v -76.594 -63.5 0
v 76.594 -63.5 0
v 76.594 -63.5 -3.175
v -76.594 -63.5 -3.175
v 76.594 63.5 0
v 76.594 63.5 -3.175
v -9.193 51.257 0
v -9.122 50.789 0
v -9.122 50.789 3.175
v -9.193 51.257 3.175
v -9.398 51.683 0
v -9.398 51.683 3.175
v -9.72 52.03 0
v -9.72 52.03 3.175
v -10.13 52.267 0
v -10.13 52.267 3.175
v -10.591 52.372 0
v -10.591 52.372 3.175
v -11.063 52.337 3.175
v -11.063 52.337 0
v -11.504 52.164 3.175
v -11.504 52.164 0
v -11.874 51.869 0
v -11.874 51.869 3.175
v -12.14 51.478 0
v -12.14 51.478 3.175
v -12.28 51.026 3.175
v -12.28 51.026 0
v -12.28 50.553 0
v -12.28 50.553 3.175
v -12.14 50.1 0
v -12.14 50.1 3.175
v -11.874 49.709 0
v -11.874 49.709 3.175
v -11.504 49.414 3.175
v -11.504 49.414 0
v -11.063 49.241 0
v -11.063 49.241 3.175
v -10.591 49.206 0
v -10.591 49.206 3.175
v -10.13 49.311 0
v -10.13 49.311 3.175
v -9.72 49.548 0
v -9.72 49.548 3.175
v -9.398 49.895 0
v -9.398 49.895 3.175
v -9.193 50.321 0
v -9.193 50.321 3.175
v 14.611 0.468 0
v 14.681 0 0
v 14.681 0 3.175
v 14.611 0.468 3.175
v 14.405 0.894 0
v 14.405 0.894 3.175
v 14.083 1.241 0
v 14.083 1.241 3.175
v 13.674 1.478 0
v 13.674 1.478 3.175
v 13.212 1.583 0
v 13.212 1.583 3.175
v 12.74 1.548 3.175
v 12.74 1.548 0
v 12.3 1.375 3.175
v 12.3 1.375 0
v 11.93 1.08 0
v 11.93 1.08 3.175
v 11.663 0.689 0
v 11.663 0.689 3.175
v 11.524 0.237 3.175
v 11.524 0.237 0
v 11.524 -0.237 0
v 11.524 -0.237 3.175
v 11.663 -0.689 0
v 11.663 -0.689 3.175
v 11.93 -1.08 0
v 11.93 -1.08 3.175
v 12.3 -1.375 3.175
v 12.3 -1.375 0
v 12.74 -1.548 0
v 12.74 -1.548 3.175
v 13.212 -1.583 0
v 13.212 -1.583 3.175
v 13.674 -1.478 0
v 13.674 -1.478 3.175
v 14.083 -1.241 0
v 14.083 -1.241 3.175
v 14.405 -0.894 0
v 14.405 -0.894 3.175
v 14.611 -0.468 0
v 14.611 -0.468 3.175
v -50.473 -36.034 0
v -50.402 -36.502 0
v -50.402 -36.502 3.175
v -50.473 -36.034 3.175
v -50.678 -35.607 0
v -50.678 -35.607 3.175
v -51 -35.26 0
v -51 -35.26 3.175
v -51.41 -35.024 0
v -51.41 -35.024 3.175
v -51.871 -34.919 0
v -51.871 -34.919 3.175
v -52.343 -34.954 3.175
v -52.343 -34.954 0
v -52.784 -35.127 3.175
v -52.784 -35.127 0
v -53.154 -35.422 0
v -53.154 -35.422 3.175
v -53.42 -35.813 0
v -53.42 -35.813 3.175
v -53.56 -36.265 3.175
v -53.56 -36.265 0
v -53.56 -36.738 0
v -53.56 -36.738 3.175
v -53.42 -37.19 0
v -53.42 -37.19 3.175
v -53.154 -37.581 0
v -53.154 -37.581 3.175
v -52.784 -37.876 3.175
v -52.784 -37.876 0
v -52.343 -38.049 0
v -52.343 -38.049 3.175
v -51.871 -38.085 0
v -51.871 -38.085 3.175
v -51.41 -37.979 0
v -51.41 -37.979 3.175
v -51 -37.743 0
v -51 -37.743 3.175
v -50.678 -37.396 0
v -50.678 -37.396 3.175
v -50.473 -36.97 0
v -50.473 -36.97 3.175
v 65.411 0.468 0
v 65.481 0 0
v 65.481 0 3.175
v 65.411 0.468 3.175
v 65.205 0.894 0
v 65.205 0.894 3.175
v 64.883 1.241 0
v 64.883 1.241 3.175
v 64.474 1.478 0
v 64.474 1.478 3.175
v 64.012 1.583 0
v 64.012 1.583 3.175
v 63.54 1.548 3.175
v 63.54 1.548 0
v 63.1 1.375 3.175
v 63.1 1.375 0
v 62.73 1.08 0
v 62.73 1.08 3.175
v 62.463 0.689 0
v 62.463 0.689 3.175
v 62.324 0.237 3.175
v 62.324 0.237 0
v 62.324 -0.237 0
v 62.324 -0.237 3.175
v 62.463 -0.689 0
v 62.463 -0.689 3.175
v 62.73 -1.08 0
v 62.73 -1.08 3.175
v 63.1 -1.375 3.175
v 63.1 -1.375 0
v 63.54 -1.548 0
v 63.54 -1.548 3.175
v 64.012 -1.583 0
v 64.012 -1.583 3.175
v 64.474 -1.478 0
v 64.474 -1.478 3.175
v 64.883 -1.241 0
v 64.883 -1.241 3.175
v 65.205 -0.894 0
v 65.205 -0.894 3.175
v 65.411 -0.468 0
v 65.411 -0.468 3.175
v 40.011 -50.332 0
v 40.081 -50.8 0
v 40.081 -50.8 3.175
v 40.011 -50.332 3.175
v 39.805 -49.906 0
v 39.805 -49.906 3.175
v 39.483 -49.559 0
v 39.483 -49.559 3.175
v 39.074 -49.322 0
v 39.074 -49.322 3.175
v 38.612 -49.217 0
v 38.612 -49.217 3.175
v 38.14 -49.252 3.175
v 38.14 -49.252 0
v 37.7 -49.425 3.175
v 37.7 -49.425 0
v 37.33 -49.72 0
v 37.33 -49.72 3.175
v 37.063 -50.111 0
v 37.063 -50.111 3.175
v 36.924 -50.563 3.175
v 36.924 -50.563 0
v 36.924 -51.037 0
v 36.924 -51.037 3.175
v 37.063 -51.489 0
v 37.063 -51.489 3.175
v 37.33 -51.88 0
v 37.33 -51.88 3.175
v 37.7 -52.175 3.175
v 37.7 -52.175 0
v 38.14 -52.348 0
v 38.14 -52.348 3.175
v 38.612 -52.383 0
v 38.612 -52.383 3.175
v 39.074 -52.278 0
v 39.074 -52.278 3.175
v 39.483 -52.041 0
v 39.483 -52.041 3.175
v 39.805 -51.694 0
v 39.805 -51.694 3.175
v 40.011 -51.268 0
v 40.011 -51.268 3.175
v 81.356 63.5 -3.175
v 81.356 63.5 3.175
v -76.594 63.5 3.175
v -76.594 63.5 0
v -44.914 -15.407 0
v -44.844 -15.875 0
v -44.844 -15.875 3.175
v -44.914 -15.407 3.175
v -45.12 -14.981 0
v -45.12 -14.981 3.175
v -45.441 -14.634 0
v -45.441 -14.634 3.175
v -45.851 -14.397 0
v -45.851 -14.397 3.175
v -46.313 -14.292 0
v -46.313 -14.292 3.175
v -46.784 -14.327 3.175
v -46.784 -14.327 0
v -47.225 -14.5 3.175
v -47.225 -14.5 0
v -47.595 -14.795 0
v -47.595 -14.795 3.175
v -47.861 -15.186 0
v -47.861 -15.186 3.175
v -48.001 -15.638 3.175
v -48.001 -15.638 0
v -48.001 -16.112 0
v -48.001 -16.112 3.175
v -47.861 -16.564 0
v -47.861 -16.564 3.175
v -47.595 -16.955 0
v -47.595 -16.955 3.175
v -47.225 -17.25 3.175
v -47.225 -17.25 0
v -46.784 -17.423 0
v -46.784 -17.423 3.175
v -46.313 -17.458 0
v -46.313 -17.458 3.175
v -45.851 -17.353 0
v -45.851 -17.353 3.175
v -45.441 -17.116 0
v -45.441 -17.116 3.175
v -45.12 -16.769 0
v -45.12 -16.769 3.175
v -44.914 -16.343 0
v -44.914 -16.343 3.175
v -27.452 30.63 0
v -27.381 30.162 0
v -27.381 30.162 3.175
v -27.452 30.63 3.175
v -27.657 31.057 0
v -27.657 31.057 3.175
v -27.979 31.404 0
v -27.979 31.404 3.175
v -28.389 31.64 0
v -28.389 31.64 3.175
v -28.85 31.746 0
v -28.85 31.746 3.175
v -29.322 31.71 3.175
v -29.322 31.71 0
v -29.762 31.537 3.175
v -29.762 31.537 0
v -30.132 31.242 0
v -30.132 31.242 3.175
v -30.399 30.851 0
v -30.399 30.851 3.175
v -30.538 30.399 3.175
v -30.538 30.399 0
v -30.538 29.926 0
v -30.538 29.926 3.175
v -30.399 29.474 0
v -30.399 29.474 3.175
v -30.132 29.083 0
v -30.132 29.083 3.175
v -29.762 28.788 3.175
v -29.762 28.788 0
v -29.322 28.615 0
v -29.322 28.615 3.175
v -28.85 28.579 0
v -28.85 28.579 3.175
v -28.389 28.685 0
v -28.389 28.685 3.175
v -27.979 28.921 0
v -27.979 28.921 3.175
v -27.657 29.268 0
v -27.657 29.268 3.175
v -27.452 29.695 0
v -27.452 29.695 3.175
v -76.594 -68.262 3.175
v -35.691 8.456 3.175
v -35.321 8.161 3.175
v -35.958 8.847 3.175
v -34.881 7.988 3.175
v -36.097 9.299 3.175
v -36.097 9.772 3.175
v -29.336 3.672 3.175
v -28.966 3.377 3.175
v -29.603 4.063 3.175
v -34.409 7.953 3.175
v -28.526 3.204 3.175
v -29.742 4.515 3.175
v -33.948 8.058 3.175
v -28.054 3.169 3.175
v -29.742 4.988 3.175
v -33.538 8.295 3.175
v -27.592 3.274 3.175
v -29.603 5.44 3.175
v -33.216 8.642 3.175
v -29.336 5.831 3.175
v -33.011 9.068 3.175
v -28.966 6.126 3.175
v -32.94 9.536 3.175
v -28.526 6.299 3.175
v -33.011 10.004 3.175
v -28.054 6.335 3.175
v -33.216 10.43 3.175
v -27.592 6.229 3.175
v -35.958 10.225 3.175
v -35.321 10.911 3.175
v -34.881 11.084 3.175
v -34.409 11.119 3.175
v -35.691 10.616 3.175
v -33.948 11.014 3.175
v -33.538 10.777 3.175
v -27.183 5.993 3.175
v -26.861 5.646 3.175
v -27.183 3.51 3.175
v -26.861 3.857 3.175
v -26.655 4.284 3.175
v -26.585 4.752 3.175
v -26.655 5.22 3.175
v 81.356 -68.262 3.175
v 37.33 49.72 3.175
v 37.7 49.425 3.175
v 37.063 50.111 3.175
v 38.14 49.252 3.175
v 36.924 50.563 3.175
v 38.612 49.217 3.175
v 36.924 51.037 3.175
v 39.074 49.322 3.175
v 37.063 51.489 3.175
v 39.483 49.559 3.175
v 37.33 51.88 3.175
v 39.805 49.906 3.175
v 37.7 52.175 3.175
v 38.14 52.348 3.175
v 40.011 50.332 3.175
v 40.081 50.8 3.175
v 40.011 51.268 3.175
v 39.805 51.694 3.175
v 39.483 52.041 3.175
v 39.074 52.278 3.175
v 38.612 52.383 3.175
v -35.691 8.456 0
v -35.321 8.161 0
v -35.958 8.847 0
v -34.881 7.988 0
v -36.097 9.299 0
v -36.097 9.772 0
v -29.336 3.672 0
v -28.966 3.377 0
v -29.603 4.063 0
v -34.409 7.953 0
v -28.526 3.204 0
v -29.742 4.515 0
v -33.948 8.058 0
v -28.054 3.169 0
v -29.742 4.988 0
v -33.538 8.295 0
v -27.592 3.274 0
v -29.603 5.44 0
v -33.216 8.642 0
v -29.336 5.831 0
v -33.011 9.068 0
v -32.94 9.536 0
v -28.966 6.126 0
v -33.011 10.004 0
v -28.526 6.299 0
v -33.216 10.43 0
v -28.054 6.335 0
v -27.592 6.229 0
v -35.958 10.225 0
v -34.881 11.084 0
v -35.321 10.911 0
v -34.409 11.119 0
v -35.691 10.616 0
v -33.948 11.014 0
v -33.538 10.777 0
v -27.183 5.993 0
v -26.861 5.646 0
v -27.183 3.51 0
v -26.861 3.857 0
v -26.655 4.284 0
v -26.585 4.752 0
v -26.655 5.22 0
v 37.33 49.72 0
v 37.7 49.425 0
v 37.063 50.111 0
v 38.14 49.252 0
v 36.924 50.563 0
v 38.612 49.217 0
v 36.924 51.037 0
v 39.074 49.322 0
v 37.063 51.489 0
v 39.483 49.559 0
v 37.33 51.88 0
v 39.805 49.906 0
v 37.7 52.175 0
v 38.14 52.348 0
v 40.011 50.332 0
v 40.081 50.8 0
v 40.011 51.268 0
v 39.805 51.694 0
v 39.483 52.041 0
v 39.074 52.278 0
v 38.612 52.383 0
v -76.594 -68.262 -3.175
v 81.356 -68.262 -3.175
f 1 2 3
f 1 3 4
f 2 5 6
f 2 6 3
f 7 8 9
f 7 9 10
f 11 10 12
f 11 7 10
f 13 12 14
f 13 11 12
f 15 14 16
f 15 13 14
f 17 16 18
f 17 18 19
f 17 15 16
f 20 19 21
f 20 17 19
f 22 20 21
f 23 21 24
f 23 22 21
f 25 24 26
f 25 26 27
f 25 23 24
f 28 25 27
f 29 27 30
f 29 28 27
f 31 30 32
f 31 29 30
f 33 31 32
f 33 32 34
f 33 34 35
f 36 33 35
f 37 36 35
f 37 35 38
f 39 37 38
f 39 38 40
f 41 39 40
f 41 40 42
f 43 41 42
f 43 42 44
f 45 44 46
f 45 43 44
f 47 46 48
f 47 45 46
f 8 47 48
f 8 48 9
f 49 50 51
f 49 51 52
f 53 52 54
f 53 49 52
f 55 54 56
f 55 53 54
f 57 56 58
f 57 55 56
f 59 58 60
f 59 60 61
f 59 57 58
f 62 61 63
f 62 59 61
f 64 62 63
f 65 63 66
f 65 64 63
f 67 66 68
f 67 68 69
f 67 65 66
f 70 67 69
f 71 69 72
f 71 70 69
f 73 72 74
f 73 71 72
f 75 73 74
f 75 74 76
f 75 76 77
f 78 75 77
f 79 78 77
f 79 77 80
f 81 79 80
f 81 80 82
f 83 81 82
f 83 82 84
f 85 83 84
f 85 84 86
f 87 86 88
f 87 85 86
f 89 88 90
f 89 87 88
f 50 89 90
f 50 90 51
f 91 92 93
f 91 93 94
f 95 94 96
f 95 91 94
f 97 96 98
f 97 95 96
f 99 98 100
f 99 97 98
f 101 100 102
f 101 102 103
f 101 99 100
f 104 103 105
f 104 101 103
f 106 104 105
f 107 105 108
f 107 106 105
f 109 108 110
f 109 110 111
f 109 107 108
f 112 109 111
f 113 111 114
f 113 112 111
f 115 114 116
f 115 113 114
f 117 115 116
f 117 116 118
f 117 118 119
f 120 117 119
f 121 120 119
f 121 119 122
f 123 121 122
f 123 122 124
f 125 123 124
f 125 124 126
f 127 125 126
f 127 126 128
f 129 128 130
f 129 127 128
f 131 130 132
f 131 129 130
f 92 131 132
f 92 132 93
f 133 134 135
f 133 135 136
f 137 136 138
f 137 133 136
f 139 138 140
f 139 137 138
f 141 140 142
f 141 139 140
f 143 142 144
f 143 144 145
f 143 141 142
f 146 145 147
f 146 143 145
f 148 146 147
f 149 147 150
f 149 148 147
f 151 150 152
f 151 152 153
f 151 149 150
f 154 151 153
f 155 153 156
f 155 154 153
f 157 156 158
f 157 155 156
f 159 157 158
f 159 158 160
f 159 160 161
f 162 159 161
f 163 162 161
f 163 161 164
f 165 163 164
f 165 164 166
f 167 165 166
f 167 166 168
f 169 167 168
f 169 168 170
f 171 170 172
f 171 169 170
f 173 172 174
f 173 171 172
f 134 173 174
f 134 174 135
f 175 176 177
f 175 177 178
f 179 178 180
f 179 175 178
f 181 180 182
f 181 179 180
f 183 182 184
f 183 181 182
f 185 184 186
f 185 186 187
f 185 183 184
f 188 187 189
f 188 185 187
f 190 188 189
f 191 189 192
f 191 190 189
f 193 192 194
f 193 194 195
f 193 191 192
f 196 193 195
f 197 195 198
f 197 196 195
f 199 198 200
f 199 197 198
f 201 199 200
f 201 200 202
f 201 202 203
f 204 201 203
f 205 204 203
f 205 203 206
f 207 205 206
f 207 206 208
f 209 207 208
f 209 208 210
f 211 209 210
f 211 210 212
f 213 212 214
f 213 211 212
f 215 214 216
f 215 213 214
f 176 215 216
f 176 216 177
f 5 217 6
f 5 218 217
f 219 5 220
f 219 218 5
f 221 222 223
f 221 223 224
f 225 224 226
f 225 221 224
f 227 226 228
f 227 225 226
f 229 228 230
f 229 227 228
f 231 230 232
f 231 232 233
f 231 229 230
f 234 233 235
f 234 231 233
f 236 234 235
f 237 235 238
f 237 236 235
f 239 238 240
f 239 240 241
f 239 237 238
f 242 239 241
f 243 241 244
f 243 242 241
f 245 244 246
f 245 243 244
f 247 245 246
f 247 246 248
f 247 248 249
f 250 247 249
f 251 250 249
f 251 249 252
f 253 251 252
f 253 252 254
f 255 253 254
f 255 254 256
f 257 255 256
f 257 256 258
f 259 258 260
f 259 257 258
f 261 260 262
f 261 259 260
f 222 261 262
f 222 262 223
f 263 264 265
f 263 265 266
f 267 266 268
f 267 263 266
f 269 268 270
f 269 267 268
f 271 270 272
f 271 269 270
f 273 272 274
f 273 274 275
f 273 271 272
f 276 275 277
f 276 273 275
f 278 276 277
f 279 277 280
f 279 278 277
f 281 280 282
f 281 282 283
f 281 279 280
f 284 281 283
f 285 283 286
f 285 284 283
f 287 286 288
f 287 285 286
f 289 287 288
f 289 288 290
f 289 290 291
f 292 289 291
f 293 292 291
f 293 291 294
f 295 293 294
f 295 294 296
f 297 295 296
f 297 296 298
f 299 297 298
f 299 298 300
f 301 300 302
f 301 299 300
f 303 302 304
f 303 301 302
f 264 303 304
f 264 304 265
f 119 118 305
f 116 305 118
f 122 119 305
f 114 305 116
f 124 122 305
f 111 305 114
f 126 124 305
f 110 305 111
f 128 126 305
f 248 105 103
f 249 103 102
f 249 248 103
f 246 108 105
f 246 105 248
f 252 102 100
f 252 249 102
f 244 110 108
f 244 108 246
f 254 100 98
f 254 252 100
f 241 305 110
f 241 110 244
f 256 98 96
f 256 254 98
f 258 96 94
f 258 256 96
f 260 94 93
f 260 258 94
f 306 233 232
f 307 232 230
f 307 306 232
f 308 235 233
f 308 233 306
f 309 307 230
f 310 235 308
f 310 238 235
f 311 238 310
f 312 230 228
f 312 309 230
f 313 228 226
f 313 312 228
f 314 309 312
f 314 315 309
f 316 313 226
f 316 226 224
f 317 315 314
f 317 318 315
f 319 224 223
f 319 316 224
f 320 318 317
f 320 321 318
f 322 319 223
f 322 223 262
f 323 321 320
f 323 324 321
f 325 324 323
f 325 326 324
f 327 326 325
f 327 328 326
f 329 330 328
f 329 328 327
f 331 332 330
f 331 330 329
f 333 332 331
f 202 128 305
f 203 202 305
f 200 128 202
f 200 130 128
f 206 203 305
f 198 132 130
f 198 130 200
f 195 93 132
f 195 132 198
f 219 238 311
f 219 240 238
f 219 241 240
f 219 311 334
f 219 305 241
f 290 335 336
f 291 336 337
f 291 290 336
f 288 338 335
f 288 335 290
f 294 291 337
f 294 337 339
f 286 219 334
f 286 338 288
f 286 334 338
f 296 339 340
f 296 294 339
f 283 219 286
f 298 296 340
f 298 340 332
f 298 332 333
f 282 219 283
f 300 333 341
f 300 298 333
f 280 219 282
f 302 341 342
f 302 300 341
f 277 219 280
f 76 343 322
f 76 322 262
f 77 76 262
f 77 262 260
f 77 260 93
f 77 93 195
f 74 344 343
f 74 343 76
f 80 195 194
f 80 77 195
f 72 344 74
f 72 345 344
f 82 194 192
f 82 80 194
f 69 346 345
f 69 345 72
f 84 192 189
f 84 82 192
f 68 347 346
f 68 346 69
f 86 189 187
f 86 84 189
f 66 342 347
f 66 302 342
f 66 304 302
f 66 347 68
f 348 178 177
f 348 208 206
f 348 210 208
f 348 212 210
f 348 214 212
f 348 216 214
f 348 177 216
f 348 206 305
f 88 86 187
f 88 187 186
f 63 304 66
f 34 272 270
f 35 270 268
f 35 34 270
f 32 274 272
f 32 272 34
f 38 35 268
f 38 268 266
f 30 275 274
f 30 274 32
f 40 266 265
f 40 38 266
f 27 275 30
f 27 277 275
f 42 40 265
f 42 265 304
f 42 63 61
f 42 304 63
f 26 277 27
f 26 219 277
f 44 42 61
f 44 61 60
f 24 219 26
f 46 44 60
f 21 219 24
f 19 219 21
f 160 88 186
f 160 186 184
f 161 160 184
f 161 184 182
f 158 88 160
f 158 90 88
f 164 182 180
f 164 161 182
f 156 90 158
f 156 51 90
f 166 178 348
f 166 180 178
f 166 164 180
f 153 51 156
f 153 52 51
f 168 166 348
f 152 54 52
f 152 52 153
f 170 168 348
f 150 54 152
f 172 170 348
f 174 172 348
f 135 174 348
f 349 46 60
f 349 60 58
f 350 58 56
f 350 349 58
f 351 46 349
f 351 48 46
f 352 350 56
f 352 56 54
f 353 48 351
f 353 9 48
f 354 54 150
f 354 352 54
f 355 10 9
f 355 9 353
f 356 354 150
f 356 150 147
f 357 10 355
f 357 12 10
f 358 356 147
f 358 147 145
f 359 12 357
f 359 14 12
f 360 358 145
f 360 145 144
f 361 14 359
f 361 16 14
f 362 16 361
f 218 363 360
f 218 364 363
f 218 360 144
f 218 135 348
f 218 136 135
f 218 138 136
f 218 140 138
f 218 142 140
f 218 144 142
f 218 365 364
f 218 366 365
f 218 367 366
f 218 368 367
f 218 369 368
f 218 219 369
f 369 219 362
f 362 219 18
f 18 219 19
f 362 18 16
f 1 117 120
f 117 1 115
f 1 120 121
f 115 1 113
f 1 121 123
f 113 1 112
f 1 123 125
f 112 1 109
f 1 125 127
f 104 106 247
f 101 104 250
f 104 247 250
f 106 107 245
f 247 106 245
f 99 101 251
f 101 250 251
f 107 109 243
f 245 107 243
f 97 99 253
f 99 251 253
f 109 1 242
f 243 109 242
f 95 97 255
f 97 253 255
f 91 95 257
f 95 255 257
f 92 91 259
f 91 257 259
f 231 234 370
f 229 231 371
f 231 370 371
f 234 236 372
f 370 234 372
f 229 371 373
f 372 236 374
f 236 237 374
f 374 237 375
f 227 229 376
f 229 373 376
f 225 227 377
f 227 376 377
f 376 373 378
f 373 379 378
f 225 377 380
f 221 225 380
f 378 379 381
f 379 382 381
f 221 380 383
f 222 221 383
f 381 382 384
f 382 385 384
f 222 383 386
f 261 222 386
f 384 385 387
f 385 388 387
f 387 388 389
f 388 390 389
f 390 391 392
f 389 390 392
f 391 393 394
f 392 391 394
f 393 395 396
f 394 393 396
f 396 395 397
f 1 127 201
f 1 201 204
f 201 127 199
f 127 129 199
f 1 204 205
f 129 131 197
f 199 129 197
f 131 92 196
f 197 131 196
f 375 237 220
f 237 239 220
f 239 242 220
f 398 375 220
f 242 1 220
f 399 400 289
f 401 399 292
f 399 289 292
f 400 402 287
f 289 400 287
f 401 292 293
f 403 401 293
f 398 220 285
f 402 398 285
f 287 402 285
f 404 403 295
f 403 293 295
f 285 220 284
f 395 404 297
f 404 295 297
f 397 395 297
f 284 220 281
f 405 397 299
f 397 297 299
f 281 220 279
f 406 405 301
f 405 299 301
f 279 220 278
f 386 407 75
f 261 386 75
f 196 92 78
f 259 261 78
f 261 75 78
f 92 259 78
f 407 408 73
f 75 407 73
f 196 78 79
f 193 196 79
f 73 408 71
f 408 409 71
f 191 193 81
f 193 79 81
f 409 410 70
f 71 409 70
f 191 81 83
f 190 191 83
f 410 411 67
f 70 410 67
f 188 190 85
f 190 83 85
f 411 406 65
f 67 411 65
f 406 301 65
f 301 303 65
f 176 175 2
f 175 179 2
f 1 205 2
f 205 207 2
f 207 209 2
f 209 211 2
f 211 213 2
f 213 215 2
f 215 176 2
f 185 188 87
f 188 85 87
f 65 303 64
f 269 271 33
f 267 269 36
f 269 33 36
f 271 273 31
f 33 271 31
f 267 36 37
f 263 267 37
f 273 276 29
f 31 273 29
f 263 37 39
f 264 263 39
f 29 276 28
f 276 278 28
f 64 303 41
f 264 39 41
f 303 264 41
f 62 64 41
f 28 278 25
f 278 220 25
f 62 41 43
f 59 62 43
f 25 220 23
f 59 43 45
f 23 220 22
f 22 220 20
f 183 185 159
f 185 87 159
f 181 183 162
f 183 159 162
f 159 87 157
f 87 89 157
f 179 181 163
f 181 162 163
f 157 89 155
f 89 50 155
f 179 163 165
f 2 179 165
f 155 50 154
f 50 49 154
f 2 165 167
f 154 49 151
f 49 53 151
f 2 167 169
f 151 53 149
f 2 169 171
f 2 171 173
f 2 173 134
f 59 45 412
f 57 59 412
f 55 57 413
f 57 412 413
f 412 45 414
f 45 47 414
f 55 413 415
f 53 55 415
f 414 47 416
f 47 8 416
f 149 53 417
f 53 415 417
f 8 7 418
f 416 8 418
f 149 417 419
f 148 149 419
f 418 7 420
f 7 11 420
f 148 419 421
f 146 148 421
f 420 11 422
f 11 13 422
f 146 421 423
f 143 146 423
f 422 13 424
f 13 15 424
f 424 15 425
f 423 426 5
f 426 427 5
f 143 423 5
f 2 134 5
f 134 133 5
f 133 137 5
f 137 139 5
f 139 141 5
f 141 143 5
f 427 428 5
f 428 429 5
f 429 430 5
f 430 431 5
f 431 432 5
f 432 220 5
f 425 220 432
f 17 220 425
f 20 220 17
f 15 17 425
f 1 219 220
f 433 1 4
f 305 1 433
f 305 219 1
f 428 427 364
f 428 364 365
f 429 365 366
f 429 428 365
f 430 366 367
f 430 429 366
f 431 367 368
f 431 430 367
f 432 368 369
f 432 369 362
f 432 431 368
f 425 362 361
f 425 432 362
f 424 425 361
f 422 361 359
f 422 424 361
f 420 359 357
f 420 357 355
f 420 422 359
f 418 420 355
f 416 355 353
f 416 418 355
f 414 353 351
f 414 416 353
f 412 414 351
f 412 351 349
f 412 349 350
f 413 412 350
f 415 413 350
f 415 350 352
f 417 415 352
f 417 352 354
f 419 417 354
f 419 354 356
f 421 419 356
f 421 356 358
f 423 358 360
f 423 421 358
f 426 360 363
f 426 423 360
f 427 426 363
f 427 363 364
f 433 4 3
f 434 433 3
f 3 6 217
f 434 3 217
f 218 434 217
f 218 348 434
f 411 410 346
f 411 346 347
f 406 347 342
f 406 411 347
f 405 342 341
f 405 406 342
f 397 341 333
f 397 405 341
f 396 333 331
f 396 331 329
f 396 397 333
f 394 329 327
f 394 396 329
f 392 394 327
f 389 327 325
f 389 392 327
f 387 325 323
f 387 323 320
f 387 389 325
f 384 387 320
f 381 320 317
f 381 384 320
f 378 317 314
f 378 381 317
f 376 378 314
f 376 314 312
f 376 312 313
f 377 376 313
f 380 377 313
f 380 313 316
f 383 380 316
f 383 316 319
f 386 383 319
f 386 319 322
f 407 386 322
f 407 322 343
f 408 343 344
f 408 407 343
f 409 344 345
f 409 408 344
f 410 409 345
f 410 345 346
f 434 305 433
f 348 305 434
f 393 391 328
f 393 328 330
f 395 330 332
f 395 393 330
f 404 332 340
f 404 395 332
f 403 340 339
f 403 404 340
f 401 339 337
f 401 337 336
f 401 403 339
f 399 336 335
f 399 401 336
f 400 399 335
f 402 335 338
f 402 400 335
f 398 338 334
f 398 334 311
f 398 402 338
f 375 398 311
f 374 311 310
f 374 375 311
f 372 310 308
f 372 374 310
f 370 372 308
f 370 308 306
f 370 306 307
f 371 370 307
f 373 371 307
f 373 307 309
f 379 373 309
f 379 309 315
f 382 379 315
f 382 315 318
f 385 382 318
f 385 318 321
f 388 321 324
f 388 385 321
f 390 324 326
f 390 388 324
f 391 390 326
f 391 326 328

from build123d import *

# Parameters (mm, degrees)
F0_W     = 153.1874
F0_H     = 127
F0_R     = 1.5875
F1_DEPTH = 3.175
F2_DEPTH = 3.175


with BuildPart() as f1:
    # F0 (on Top) → F1 (new body)
    with BuildSketch(Plane.XY):
        Polygon((76.5937, 63.5), (76.5937, -63.5), (-76.5937, -63.5), (-76.5937, -68.2625), (81.3562, -68.2625), (81.3562, 63.5), align=None)
        Rectangle(F0_W, F0_H)
        with Locations((-51.98999, -36.501629)):
            Circle(F0_R, mode=Mode.SUBTRACT)
        with Locations((-46.4312, -15.875)):
            Circle(F0_R, mode=Mode.SUBTRACT)
        with Locations((38.4937, -50.8)):
            Circle(F0_R, mode=Mode.SUBTRACT)
        with Locations((-28.17241, 4.751629)):
            Circle(F0_R, mode=Mode.SUBTRACT)
        with Locations((-34.52749, 9.535871)):
            Circle(F0_R, mode=Mode.SUBTRACT)
        with Locations((-28.9687, 30.1625)):
            Circle(F0_R, mode=Mode.SUBTRACT)
        with Locations((-10.70991, 50.789129)):
            Circle(F0_R, mode=Mode.SUBTRACT)
        with Locations((13.0937, 0)):
            Circle(F0_R, mode=Mode.SUBTRACT)
        with Locations((63.8937, 0)):
            Circle(F0_R, mode=Mode.SUBTRACT)
        with Locations((38.4937, 50.8)):
            Circle(F0_R, mode=Mode.SUBTRACT)
    extrude(amount=F1_DEPTH)

    # F0 (on Top) → F2 (join)
    with BuildSketch(Plane.XY):
        Polygon((76.5937, 63.5), (76.5937, -63.5), (-76.5937, -63.5), (-76.5937, -68.2625), (81.3562, -68.2625), (81.3562, 63.5), align=None)
    extrude(amount=-F2_DEPTH)


solid = f1.part
